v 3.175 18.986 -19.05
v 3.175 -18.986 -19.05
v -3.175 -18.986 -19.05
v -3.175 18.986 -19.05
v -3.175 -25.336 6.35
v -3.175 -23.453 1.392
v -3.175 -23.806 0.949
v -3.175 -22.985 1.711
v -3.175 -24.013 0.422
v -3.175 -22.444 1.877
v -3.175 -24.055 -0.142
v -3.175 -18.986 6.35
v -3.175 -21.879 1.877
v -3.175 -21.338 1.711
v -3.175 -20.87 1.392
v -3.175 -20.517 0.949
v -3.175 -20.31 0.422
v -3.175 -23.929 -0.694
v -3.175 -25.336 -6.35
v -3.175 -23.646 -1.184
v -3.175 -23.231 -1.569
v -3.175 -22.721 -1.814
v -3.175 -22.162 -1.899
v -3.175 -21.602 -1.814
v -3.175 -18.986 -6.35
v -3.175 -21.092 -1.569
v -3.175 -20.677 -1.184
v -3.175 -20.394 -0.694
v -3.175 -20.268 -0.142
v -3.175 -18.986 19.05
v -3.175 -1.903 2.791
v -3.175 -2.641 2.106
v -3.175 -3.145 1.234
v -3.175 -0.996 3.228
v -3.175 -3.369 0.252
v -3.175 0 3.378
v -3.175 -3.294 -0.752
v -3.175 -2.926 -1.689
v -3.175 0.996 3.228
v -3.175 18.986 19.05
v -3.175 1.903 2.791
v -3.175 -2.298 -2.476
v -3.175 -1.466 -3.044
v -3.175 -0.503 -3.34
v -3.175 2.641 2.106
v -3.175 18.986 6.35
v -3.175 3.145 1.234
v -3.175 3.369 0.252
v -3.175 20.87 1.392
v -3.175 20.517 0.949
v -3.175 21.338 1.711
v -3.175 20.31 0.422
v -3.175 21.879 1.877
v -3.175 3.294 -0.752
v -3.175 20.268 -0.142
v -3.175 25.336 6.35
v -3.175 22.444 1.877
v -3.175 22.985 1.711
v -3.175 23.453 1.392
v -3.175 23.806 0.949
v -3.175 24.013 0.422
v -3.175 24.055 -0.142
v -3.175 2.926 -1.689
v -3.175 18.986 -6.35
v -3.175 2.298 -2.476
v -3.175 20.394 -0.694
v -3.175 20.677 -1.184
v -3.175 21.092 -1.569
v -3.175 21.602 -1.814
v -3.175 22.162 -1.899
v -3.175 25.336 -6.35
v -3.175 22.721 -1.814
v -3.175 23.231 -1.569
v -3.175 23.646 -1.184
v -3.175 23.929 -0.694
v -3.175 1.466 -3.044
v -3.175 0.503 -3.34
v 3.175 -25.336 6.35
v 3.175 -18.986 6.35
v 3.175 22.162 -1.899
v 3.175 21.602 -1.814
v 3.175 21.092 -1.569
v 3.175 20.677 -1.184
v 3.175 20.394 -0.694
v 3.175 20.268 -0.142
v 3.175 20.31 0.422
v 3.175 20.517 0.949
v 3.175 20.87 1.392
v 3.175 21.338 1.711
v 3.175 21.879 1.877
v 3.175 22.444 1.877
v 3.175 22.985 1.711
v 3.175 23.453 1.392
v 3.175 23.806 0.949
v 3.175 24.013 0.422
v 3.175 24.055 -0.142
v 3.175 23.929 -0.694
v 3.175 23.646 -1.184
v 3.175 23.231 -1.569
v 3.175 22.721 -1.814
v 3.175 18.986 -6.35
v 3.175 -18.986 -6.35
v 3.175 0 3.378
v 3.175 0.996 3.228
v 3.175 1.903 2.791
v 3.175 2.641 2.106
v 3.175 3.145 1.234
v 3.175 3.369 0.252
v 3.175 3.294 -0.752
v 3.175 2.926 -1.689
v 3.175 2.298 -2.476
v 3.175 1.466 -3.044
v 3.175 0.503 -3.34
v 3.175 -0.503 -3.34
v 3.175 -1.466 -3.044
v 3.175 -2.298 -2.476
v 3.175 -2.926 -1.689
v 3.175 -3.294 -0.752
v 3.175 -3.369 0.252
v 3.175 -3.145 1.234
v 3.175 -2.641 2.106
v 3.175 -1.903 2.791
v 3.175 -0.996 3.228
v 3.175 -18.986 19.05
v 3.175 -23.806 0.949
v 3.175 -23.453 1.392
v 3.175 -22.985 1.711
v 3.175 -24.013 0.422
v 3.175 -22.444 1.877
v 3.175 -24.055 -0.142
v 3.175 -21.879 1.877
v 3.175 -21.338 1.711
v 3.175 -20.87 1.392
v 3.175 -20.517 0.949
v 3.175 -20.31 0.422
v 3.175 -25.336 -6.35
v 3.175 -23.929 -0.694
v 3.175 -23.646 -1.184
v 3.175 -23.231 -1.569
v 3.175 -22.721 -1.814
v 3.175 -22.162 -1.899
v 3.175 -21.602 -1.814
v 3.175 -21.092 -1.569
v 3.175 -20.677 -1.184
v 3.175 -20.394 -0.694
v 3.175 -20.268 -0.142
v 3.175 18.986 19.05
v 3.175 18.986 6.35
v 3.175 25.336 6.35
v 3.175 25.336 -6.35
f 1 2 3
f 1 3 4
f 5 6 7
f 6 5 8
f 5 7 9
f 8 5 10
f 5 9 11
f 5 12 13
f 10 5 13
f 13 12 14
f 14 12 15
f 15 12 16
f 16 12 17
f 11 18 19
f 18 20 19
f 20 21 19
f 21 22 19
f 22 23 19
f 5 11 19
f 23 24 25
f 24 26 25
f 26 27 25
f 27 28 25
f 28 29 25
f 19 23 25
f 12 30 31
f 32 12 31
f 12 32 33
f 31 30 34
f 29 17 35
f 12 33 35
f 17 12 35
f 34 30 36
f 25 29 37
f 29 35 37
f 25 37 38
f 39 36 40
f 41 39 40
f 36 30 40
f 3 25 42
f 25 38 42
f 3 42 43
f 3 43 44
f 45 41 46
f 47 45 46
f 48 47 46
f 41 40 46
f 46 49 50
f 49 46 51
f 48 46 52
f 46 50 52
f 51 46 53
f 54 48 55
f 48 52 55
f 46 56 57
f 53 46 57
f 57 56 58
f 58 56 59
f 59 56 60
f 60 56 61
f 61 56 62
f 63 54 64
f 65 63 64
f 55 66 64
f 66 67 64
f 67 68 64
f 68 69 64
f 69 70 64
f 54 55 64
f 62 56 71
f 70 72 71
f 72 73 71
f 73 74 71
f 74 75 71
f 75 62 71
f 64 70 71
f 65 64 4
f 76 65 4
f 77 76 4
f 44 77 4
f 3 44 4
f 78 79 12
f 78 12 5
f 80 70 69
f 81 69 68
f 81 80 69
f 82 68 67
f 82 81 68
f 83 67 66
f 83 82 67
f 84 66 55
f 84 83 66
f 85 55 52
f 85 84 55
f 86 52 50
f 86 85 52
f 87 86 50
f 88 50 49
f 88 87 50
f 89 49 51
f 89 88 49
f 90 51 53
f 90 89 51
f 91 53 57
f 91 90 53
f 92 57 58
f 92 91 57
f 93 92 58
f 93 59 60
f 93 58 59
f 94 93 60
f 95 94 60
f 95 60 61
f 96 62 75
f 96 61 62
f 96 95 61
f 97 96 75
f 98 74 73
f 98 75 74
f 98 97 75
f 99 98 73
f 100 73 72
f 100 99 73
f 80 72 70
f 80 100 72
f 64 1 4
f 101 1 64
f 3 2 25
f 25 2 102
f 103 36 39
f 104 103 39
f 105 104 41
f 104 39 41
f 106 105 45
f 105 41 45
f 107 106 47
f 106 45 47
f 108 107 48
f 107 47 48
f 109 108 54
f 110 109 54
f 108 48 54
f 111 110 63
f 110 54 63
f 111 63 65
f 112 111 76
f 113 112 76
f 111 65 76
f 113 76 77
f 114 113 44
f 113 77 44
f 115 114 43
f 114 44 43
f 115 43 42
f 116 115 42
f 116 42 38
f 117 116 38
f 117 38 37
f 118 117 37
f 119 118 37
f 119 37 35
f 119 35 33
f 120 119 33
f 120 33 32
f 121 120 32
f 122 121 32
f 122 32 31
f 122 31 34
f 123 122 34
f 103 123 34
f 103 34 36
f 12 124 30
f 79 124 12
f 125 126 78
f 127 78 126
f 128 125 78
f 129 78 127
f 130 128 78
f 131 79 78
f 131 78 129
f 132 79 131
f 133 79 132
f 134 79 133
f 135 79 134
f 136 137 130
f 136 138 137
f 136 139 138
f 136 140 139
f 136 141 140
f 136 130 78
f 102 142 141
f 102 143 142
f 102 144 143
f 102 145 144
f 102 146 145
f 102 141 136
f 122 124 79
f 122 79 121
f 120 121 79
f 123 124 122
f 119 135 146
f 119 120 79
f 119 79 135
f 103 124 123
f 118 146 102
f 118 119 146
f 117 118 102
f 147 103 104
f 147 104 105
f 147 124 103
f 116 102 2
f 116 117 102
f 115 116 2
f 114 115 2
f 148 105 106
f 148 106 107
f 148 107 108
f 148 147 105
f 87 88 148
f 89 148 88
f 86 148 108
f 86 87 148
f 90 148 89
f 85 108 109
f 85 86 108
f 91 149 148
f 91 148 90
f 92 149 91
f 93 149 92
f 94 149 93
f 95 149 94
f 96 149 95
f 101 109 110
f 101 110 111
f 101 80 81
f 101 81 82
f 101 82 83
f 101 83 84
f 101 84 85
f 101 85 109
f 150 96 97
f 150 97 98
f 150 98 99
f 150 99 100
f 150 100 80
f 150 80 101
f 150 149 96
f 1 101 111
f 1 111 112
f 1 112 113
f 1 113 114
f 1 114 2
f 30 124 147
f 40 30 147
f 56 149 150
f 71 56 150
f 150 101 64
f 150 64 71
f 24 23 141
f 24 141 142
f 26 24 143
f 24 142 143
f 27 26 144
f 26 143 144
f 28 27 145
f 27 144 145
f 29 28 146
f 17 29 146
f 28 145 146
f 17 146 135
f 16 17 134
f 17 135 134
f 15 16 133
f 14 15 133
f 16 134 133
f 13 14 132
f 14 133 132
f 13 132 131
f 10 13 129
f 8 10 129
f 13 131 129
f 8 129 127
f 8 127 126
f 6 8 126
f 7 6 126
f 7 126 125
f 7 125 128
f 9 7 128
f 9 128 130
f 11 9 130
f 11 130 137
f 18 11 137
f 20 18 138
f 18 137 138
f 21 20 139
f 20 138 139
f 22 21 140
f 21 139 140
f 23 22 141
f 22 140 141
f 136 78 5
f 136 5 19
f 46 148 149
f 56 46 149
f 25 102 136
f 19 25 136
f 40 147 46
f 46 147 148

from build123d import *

# Parameters (mm, degrees)
SKETCH1_W               = 38.1
SKETCH1_H               = 50.673
BOSS_EXTRUDE1_DEPTH     = 3.175
CUT_EXTRUDE1_REACH      = 34.329
SKETCH2_W               = 12.7
SKETCH2_H               = 6.35
MIRROR2_COPY_1_REACH    = 34.329
MIRROR2_COPY_1_SKETCH_W = 12.7
MIRROR2_COPY_1_SKETCH_H = 6.35
F_1_4_CLEARANCE_HOLE1_D = 6.7564


with BuildPart() as part:
    # Sketch1 → Boss-Extrude1 (new, symmetric)
    with BuildSketch(Plane(origin=(0, 0, 0), x_dir=(0, 0, -1), z_dir=(1, 0, 0))):
        Rectangle(SKETCH1_W, SKETCH1_H)
    extrude(amount=BOSS_EXTRUDE1_DEPTH, both=True)

    # Sketch2 → Cut-Extrude1 (cut, up to next)
    with BuildSketch(Plane(origin=(3.175, 0, 0), x_dir=(0, 0, -1), z_dir=(1, 0, 0)), mode=Mode.PRIVATE) as cut_extrude1_sk1:
        with Locations((-12.7, 22.1615)):
            Rectangle(SKETCH2_W, SKETCH2_H)
    cut_extrude1_tool1 = extrude(cut_extrude1_sk1.sketch, amount=-CUT_EXTRUDE1_REACH, mode=Mode.PRIVATE) & part.part
    cut_extrude1 = cut_extrude1_tool1.solids().sort_by_distance((3.175, 22.1615, 12.7))[0]
    add(cut_extrude1, mode=Mode.SUBTRACT)

    # Mirror1: Cut-Extrude1 across plane
    add(cut_extrude1.mirror(Plane.XY), mode=Mode.SUBTRACT)

    # Sketch3 → #6 Clearance Hole1 (revolve, cut)
    with BuildSketch(Plane(origin=(3.175, 22.1615, 0), x_dir=(0, 0, -1), z_dir=(0, 1, 0))):
        Polygon((0, 0), (0, 10.030824014), (1.89865, 8.89), (1.89865, 0), align=None)
    f_6_clearance_hole1 = revolve(axis=Axis((9.525, 22.1615, 0), (-1, 0, 0)), mode=Mode.SUBTRACT)

    # Mirror2: Cut-Extrude1, #6 Clearance Hole1 across plane
    add(cut_extrude1.mirror(Plane.ZX), mode=Mode.SUBTRACT)
    add(f_6_clearance_hole1.mirror(Plane.ZX), mode=Mode.SUBTRACT)

    # Mirror2 copy 1 sketch → Mirror2 copy 1 (cut, up to next)
    with BuildSketch(Plane(origin=(3.175, 0, 0), x_dir=(0, 0, 1), z_dir=(1, 0, 0)), mode=Mode.PRIVATE) as mirror2_copy_1_sk1:
        with Locations((-12.7, 22.1615)):
            Rectangle(MIRROR2_COPY_1_SKETCH_W, MIRROR2_COPY_1_SKETCH_H)
    mirror2_copy_1_tool1 = extrude(mirror2_copy_1_sk1.sketch, amount=-MIRROR2_COPY_1_REACH, mode=Mode.PRIVATE) & part.part
    add(mirror2_copy_1_tool1.solids().sort_by_distance((3.175, -22.1615, -12.7))[0], mode=Mode.SUBTRACT)

    # 1/4 Clearance Hole1 (through all)
    with Locations(Plane(origin=(3.175, 0, 0), x_dir=(0, 0, -1), z_dir=(1, 0, 0))):
        with Locations((0, 0)):
            Hole(F_1_4_CLEARANCE_HOLE1_D / 2)


solid = part.part
